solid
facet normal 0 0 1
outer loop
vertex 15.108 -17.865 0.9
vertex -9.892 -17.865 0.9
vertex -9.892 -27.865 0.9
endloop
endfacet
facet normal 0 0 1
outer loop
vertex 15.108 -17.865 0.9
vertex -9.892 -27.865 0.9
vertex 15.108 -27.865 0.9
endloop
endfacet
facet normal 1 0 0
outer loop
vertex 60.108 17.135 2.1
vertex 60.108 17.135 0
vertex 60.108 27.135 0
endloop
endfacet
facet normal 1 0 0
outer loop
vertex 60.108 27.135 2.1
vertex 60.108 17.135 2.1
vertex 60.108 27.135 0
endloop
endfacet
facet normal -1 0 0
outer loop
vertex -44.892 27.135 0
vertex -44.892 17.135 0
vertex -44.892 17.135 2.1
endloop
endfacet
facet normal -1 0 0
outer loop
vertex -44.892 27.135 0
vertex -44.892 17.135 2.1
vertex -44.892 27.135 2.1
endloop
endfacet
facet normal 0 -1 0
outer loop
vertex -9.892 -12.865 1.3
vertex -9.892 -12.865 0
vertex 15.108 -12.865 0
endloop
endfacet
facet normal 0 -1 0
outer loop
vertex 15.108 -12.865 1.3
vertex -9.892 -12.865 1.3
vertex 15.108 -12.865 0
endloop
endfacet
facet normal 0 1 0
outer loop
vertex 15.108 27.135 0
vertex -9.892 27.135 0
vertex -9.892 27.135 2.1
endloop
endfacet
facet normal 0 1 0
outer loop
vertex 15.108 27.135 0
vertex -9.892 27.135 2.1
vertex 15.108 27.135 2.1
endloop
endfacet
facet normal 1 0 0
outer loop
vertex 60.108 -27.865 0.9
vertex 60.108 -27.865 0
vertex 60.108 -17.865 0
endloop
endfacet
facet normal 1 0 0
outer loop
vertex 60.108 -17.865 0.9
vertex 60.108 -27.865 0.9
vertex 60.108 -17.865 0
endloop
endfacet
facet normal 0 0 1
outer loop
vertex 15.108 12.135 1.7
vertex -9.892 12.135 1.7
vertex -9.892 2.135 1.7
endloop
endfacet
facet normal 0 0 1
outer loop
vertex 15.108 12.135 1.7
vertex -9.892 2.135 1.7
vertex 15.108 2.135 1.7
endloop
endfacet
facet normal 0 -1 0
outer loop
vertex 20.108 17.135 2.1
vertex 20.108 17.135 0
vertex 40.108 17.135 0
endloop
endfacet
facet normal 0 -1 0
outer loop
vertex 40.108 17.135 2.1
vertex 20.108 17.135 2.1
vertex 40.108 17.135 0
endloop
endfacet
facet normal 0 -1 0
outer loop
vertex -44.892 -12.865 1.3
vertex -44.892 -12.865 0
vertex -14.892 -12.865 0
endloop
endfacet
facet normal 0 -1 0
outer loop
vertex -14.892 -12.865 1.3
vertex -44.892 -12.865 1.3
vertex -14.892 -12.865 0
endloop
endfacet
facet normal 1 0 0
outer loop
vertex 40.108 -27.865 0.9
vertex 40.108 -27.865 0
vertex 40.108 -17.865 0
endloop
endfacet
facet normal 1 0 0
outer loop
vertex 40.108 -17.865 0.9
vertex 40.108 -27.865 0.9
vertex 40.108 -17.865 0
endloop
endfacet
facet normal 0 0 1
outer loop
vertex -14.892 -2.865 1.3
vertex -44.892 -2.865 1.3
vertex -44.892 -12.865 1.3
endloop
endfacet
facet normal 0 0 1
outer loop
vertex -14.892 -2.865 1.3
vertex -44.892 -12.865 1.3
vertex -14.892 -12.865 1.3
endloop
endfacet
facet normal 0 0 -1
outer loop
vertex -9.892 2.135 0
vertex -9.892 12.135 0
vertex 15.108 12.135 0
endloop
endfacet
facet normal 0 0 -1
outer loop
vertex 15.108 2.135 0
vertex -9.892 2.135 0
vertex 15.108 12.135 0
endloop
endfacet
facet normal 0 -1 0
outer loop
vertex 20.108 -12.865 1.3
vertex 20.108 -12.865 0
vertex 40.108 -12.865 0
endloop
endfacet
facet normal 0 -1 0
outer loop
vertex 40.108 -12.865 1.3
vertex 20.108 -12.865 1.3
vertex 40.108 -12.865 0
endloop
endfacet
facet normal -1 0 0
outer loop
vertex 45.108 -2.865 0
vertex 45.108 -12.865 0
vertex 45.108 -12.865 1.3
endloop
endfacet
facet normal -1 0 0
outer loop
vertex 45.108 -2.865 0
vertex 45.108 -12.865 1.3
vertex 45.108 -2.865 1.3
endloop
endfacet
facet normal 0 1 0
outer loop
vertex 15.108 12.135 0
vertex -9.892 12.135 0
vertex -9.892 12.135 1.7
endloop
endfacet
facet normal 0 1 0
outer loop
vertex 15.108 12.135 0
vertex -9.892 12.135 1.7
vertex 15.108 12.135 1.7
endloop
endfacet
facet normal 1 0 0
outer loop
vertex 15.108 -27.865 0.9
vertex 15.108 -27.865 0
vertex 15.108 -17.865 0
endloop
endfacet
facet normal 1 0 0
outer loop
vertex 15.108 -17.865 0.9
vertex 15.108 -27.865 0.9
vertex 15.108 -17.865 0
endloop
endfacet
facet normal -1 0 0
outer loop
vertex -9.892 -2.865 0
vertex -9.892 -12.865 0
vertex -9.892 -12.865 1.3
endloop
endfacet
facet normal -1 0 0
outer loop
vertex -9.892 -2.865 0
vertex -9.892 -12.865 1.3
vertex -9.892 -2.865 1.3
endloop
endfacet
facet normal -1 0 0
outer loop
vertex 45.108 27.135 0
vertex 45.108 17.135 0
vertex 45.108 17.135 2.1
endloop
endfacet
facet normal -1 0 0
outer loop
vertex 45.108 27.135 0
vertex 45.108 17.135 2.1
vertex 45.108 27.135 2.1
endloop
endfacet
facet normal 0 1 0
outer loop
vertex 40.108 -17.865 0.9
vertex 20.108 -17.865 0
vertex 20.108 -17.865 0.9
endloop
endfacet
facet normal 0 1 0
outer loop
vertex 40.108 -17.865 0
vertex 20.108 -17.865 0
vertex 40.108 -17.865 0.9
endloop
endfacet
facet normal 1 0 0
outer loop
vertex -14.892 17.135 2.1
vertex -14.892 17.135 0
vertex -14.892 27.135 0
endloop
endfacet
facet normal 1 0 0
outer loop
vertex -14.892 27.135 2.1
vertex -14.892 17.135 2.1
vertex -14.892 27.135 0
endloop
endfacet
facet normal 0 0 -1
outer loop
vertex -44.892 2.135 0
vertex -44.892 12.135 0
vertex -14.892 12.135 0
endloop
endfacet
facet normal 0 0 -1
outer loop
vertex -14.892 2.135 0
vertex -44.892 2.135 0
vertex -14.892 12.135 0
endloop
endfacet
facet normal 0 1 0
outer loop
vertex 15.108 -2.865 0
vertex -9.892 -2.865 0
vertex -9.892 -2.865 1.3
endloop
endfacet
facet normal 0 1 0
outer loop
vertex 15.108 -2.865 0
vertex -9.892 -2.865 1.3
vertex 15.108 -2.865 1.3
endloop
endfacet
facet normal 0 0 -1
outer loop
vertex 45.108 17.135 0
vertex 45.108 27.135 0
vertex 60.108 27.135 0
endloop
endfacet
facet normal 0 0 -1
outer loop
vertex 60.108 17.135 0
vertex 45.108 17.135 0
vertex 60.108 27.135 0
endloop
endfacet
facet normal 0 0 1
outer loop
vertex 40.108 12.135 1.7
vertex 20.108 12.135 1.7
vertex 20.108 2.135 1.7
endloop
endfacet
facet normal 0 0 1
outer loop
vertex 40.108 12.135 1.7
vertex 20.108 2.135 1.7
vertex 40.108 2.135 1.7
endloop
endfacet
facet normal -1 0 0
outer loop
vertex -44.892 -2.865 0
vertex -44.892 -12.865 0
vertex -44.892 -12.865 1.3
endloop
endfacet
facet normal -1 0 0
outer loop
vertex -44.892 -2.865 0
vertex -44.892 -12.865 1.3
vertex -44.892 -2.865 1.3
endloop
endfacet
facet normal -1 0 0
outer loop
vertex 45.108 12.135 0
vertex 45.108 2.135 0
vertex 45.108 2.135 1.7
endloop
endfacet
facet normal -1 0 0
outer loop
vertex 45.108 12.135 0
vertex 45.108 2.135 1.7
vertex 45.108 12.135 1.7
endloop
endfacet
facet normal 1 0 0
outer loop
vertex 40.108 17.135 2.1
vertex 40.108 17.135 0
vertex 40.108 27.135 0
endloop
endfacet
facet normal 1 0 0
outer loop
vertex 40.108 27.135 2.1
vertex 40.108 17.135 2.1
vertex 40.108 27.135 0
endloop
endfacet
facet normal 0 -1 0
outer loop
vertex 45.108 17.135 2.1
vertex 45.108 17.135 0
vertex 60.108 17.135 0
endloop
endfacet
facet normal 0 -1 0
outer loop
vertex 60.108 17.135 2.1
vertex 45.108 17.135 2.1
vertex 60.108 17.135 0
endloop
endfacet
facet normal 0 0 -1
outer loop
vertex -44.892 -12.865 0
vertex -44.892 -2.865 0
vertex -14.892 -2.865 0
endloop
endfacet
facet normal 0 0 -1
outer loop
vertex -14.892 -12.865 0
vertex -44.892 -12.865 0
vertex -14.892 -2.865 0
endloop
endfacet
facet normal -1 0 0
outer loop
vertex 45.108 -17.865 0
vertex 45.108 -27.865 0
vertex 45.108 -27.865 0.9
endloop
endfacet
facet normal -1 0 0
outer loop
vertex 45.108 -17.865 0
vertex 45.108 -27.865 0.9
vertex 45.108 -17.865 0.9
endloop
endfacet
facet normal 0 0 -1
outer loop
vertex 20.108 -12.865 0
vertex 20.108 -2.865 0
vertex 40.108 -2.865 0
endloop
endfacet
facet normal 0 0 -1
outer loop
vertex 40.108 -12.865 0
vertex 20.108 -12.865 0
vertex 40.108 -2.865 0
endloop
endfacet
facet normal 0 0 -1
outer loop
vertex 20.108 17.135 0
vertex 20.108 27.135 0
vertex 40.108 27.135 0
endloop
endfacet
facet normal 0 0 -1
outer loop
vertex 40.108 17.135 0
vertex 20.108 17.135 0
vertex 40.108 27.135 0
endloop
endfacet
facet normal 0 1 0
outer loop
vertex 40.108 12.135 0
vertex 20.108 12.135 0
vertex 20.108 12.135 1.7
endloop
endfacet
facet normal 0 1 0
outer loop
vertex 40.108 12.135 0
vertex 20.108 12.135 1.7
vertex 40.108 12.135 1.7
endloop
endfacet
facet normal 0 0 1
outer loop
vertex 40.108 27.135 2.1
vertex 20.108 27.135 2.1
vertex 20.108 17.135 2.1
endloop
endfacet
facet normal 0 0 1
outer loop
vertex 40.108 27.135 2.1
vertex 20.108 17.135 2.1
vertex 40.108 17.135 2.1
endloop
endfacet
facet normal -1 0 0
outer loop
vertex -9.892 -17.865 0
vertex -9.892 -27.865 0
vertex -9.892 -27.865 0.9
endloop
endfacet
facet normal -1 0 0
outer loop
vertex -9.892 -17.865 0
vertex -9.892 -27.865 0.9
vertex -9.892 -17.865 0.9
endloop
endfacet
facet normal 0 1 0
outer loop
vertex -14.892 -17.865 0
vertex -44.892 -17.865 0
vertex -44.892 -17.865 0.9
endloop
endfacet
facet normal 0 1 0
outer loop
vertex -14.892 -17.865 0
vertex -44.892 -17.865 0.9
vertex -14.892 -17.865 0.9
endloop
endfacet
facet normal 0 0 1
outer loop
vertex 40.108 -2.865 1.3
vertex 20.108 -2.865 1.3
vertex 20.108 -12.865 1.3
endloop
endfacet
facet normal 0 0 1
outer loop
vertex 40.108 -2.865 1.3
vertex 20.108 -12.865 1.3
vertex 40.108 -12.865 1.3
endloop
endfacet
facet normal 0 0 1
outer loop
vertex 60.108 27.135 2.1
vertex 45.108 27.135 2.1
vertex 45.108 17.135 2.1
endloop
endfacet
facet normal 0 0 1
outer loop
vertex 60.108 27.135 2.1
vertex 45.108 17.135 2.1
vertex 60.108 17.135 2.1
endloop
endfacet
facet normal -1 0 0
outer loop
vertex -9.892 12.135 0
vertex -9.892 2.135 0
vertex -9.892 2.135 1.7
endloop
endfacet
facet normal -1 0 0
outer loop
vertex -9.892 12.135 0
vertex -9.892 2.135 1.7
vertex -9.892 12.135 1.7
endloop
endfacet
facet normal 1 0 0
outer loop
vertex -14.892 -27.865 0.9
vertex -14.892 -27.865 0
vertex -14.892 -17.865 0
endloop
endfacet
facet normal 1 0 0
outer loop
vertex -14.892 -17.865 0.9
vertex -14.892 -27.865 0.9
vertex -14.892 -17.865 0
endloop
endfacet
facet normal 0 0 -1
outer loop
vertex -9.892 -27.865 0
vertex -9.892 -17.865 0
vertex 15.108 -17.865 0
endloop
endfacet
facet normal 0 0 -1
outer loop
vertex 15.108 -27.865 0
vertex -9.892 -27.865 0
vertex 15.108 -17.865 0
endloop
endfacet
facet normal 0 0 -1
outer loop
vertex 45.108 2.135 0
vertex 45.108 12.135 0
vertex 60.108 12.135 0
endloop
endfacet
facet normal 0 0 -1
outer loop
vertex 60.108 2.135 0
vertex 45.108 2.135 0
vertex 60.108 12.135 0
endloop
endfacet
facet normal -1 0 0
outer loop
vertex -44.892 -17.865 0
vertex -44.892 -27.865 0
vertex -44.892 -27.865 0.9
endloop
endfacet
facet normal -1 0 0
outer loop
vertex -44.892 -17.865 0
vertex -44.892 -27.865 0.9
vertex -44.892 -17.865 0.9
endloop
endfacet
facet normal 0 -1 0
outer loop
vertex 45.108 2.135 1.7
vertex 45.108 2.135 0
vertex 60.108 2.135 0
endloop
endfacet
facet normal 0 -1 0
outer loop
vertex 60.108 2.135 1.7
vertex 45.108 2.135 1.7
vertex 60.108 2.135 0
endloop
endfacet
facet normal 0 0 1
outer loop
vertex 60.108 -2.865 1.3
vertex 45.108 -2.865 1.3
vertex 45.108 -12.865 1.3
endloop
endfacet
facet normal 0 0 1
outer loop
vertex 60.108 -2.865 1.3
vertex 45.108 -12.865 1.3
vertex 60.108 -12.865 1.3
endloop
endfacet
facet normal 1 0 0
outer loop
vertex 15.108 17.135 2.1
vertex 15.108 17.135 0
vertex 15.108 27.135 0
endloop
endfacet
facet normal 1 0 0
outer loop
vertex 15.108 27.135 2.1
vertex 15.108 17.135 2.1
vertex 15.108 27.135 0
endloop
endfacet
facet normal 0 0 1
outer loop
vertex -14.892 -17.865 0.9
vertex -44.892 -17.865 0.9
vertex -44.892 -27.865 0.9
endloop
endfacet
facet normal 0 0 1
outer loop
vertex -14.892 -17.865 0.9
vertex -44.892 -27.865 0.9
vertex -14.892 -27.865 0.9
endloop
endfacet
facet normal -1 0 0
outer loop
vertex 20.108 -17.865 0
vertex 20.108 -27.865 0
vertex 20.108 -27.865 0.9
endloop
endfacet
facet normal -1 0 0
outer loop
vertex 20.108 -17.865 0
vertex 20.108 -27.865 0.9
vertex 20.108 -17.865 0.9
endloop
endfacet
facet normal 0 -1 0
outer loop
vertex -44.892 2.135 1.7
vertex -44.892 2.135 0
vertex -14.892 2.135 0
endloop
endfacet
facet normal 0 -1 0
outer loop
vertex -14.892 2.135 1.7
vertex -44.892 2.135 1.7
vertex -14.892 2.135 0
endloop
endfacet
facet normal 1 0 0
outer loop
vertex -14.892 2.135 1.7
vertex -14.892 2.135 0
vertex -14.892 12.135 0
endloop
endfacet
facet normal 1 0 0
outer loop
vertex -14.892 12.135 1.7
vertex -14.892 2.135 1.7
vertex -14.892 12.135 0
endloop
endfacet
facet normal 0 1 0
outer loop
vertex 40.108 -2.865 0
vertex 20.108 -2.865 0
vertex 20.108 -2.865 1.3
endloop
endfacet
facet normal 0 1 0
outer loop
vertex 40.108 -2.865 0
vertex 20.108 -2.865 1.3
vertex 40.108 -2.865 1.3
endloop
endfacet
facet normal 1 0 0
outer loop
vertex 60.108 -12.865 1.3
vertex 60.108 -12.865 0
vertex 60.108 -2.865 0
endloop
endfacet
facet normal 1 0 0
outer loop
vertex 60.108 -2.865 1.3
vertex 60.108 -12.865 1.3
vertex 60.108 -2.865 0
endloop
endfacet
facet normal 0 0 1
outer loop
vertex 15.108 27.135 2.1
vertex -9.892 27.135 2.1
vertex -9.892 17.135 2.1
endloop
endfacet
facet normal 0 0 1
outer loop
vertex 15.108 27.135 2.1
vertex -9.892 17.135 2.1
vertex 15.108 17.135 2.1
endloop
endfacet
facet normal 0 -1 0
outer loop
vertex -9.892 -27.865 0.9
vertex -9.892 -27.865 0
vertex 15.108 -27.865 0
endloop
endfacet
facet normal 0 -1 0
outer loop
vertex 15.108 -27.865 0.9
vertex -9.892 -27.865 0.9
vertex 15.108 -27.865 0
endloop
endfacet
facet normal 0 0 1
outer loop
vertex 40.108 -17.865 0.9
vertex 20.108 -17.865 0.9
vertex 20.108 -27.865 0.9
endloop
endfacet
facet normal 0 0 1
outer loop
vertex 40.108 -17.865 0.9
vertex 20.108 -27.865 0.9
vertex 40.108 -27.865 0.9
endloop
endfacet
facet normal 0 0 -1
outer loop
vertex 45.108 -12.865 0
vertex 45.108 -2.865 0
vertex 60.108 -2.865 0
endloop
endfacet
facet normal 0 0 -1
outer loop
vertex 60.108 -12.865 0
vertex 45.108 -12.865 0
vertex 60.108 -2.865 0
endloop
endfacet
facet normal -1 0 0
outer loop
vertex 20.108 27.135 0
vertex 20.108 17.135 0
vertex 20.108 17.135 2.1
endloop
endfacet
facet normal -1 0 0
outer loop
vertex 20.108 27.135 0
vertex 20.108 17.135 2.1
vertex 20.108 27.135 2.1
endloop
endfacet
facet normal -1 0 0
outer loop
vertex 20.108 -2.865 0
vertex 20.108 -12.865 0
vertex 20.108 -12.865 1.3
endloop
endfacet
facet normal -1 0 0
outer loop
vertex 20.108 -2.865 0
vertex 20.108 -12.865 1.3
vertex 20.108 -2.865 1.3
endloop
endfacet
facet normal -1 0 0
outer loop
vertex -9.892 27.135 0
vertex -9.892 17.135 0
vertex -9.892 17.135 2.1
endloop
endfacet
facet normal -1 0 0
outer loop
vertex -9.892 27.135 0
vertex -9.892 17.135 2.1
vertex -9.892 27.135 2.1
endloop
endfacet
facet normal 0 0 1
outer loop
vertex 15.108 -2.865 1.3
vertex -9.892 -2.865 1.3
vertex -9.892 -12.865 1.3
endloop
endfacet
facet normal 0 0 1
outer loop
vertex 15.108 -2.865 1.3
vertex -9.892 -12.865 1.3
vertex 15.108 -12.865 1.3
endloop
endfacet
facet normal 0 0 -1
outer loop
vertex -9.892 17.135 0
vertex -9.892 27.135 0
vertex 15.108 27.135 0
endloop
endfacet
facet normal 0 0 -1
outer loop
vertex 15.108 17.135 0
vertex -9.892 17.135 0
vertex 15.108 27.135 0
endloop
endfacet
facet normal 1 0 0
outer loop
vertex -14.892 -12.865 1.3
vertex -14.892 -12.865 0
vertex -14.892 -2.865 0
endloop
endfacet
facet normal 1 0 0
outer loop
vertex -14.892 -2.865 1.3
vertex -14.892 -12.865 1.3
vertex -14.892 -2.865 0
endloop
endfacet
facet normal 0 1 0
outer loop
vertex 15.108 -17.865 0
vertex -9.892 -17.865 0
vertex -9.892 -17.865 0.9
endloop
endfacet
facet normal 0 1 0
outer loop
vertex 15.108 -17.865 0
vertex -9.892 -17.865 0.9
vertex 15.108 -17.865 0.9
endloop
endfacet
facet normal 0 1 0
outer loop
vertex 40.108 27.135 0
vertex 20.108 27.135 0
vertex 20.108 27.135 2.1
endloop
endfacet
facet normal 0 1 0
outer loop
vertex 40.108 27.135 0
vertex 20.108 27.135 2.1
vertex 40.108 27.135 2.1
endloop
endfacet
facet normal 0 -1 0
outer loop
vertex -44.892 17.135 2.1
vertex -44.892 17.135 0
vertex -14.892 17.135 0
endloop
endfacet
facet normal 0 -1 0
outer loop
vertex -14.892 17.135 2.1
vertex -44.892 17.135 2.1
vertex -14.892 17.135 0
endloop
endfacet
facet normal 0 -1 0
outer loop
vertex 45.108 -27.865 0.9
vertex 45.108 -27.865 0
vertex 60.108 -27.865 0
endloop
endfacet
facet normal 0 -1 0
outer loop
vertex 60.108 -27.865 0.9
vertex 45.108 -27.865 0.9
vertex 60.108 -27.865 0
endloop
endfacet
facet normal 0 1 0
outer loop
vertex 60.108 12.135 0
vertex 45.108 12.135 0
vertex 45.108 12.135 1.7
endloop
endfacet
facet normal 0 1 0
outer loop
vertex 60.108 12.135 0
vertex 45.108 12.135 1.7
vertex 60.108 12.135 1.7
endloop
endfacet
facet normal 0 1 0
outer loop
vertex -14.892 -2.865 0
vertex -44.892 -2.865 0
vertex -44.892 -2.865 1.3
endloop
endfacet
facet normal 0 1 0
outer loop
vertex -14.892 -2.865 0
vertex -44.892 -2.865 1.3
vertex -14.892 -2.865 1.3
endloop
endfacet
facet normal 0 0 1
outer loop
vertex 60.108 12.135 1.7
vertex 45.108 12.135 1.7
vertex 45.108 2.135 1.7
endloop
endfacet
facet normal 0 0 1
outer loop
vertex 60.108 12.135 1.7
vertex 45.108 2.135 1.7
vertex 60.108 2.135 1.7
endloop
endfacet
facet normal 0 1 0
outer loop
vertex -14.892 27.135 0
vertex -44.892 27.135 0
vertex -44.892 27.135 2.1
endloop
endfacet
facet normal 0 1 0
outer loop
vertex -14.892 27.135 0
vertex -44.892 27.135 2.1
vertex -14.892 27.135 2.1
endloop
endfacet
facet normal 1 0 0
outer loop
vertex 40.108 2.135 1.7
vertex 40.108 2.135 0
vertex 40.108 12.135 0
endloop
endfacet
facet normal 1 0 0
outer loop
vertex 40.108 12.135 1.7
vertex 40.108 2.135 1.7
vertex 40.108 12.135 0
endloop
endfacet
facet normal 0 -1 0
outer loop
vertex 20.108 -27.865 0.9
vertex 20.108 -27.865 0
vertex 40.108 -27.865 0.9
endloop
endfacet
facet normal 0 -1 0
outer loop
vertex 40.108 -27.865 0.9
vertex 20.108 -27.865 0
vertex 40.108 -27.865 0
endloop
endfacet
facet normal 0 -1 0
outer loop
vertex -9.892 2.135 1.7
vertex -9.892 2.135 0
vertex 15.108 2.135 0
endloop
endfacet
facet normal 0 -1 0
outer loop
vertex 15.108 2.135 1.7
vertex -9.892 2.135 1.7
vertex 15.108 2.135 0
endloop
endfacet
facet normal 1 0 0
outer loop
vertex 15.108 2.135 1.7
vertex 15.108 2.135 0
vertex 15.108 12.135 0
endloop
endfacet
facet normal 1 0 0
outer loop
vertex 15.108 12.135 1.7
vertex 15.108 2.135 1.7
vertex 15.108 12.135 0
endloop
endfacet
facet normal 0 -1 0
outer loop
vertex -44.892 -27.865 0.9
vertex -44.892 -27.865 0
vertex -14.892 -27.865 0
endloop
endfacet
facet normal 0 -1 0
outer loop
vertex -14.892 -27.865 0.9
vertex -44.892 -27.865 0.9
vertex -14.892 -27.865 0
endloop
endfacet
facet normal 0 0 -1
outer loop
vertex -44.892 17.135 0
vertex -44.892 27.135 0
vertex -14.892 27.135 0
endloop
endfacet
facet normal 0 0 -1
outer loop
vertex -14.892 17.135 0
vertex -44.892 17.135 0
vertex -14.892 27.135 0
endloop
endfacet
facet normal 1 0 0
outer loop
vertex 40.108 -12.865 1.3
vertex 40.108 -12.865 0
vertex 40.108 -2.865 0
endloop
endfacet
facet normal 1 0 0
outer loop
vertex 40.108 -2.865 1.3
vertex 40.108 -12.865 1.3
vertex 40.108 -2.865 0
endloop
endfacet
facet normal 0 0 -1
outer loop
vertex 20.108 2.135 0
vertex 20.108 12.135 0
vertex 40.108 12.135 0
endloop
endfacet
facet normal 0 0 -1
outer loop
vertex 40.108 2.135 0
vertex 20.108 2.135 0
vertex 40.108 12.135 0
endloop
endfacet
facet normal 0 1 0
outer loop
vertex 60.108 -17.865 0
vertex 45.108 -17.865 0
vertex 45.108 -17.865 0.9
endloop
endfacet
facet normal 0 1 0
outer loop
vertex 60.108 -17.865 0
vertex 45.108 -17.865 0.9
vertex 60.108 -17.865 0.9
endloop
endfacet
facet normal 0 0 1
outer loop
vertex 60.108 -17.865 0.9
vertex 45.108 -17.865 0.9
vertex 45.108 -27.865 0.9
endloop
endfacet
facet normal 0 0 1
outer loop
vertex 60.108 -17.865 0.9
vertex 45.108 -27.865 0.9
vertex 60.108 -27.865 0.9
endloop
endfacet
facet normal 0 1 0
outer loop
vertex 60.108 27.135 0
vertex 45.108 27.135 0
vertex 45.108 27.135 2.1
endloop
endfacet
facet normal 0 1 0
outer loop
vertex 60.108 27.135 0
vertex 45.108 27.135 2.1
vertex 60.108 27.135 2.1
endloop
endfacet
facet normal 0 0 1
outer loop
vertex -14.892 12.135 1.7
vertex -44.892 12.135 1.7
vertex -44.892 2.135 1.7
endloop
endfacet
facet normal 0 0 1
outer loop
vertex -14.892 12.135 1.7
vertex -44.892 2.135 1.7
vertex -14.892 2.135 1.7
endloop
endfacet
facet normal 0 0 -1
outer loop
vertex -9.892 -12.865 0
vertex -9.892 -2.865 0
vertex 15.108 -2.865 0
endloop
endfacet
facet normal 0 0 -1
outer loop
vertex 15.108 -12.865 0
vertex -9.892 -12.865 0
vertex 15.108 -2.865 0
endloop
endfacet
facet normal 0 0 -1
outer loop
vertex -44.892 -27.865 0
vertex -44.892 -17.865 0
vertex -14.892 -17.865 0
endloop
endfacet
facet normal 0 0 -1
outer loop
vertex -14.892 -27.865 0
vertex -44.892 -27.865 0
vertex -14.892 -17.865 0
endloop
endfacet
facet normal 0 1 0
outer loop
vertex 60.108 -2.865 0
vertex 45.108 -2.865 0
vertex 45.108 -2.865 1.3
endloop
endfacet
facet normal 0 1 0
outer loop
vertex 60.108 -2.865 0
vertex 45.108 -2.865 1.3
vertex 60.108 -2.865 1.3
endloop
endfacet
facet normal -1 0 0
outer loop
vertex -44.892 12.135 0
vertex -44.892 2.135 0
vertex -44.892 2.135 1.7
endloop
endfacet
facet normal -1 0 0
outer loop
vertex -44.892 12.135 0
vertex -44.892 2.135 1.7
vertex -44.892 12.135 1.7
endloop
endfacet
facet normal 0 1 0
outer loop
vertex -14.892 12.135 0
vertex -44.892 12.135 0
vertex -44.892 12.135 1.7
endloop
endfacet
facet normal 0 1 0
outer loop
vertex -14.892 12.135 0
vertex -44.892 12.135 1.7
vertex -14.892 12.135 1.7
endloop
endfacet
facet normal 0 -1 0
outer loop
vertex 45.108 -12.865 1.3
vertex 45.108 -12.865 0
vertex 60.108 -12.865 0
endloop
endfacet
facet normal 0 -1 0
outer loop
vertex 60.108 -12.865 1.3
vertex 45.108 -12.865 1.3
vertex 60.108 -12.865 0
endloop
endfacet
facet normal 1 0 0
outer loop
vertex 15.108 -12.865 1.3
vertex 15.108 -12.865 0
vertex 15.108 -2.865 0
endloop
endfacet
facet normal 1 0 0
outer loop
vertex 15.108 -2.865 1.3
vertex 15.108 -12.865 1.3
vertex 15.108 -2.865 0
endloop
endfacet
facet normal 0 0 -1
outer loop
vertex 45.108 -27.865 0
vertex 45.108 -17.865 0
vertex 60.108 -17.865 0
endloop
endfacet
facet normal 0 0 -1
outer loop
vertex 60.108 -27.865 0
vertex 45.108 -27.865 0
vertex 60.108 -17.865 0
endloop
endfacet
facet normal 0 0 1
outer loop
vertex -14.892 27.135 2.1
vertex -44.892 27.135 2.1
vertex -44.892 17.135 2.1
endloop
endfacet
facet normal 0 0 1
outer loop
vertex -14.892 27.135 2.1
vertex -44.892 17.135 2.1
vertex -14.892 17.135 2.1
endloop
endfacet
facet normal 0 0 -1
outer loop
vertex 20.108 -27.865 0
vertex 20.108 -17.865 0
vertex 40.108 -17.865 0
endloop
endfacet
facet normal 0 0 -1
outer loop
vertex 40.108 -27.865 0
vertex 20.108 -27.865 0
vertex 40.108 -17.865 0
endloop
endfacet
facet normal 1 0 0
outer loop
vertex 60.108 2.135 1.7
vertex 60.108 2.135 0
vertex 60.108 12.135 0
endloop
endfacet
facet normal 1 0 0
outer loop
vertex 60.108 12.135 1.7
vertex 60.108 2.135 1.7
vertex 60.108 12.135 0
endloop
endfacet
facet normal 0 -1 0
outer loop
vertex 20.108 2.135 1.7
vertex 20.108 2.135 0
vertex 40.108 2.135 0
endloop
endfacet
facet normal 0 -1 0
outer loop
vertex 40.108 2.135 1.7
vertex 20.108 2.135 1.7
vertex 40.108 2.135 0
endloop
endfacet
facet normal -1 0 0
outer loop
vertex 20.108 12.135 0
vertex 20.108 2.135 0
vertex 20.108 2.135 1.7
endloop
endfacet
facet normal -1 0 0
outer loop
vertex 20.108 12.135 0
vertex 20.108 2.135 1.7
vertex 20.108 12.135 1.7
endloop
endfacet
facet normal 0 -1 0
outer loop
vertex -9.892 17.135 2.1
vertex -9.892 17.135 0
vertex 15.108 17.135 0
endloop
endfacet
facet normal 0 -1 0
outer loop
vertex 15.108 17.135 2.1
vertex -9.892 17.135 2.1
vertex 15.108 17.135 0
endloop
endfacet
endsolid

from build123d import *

# Parameters (mm, degrees)
F0_W     = 30
F0_H     = 10
F0_W_2   = 25
F0_W_3   = 20
F0_W_4   = 15
F1_DEPTH = 2.1
F2_DEPTH = 1.7
F3_DEPTH = 1.3
F4_DEPTH = 0.9


with BuildPart() as f1:
    # F0 (on Top) → F1 (new body)
    with BuildSketch(Plane.XY):
        with Locations((-29.892448, 22.135165)):
            Rectangle(F0_W, F0_H)
        with Locations((2.607552, 22.135165)):
            Rectangle(F0_W_2, F0_H)
        with Locations((30.107552, 22.135165)):
            Rectangle(F0_W_3, F0_H)
        with Locations((52.607552, 22.135165)):
            Rectangle(F0_W_4, F0_H)
    extrude(amount=F1_DEPTH)


with BuildPart() as f2:
    # F0 (on Top) → F2 (new body)
    with BuildSketch(Plane.XY):
        with Locations((-29.892448, 7.135165)):
            Rectangle(F0_W, F0_H)
        with Locations((2.607552, 7.135165)):
            Rectangle(F0_W_2, F0_H)
        with Locations((30.107552, 7.135165)):
            Rectangle(F0_W_3, F0_H)
        with Locations((52.607552, 7.135165)):
            Rectangle(F0_W_4, F0_H)
    extrude(amount=F2_DEPTH)


with BuildPart() as f3:
    # F0 (on Top) → F3 (new body)
    with BuildSketch(Plane.XY):
        with Locations((-29.892448, -7.864835)):
            Rectangle(F0_W, F0_H)
        with Locations((2.607552, -7.864835)):
            Rectangle(F0_W_2, F0_H)
        with Locations((30.107552, -7.864835)):
            Rectangle(F0_W_3, F0_H)
        with Locations((52.607552, -7.864835)):
            Rectangle(F0_W_4, F0_H)
    extrude(amount=F3_DEPTH)


with BuildPart() as f4:
    # F0 (on Top) → F4 (new body)
    with BuildSketch(Plane.XY):
        with Locations((-29.892448, -22.864835)):
            Rectangle(F0_W, F0_H)
        with Locations((2.607552, -22.864835)):
            Rectangle(F0_W_2, F0_H)
        with Locations((30.107552, -22.864835)):
            Rectangle(F0_W_3, F0_H)
        with Locations((52.607552, -22.864835)):
            Rectangle(F0_W_4, F0_H)
    extrude(amount=F4_DEPTH)


solid = Compound([f1.part, f2.part, f3.part, f4.part])
